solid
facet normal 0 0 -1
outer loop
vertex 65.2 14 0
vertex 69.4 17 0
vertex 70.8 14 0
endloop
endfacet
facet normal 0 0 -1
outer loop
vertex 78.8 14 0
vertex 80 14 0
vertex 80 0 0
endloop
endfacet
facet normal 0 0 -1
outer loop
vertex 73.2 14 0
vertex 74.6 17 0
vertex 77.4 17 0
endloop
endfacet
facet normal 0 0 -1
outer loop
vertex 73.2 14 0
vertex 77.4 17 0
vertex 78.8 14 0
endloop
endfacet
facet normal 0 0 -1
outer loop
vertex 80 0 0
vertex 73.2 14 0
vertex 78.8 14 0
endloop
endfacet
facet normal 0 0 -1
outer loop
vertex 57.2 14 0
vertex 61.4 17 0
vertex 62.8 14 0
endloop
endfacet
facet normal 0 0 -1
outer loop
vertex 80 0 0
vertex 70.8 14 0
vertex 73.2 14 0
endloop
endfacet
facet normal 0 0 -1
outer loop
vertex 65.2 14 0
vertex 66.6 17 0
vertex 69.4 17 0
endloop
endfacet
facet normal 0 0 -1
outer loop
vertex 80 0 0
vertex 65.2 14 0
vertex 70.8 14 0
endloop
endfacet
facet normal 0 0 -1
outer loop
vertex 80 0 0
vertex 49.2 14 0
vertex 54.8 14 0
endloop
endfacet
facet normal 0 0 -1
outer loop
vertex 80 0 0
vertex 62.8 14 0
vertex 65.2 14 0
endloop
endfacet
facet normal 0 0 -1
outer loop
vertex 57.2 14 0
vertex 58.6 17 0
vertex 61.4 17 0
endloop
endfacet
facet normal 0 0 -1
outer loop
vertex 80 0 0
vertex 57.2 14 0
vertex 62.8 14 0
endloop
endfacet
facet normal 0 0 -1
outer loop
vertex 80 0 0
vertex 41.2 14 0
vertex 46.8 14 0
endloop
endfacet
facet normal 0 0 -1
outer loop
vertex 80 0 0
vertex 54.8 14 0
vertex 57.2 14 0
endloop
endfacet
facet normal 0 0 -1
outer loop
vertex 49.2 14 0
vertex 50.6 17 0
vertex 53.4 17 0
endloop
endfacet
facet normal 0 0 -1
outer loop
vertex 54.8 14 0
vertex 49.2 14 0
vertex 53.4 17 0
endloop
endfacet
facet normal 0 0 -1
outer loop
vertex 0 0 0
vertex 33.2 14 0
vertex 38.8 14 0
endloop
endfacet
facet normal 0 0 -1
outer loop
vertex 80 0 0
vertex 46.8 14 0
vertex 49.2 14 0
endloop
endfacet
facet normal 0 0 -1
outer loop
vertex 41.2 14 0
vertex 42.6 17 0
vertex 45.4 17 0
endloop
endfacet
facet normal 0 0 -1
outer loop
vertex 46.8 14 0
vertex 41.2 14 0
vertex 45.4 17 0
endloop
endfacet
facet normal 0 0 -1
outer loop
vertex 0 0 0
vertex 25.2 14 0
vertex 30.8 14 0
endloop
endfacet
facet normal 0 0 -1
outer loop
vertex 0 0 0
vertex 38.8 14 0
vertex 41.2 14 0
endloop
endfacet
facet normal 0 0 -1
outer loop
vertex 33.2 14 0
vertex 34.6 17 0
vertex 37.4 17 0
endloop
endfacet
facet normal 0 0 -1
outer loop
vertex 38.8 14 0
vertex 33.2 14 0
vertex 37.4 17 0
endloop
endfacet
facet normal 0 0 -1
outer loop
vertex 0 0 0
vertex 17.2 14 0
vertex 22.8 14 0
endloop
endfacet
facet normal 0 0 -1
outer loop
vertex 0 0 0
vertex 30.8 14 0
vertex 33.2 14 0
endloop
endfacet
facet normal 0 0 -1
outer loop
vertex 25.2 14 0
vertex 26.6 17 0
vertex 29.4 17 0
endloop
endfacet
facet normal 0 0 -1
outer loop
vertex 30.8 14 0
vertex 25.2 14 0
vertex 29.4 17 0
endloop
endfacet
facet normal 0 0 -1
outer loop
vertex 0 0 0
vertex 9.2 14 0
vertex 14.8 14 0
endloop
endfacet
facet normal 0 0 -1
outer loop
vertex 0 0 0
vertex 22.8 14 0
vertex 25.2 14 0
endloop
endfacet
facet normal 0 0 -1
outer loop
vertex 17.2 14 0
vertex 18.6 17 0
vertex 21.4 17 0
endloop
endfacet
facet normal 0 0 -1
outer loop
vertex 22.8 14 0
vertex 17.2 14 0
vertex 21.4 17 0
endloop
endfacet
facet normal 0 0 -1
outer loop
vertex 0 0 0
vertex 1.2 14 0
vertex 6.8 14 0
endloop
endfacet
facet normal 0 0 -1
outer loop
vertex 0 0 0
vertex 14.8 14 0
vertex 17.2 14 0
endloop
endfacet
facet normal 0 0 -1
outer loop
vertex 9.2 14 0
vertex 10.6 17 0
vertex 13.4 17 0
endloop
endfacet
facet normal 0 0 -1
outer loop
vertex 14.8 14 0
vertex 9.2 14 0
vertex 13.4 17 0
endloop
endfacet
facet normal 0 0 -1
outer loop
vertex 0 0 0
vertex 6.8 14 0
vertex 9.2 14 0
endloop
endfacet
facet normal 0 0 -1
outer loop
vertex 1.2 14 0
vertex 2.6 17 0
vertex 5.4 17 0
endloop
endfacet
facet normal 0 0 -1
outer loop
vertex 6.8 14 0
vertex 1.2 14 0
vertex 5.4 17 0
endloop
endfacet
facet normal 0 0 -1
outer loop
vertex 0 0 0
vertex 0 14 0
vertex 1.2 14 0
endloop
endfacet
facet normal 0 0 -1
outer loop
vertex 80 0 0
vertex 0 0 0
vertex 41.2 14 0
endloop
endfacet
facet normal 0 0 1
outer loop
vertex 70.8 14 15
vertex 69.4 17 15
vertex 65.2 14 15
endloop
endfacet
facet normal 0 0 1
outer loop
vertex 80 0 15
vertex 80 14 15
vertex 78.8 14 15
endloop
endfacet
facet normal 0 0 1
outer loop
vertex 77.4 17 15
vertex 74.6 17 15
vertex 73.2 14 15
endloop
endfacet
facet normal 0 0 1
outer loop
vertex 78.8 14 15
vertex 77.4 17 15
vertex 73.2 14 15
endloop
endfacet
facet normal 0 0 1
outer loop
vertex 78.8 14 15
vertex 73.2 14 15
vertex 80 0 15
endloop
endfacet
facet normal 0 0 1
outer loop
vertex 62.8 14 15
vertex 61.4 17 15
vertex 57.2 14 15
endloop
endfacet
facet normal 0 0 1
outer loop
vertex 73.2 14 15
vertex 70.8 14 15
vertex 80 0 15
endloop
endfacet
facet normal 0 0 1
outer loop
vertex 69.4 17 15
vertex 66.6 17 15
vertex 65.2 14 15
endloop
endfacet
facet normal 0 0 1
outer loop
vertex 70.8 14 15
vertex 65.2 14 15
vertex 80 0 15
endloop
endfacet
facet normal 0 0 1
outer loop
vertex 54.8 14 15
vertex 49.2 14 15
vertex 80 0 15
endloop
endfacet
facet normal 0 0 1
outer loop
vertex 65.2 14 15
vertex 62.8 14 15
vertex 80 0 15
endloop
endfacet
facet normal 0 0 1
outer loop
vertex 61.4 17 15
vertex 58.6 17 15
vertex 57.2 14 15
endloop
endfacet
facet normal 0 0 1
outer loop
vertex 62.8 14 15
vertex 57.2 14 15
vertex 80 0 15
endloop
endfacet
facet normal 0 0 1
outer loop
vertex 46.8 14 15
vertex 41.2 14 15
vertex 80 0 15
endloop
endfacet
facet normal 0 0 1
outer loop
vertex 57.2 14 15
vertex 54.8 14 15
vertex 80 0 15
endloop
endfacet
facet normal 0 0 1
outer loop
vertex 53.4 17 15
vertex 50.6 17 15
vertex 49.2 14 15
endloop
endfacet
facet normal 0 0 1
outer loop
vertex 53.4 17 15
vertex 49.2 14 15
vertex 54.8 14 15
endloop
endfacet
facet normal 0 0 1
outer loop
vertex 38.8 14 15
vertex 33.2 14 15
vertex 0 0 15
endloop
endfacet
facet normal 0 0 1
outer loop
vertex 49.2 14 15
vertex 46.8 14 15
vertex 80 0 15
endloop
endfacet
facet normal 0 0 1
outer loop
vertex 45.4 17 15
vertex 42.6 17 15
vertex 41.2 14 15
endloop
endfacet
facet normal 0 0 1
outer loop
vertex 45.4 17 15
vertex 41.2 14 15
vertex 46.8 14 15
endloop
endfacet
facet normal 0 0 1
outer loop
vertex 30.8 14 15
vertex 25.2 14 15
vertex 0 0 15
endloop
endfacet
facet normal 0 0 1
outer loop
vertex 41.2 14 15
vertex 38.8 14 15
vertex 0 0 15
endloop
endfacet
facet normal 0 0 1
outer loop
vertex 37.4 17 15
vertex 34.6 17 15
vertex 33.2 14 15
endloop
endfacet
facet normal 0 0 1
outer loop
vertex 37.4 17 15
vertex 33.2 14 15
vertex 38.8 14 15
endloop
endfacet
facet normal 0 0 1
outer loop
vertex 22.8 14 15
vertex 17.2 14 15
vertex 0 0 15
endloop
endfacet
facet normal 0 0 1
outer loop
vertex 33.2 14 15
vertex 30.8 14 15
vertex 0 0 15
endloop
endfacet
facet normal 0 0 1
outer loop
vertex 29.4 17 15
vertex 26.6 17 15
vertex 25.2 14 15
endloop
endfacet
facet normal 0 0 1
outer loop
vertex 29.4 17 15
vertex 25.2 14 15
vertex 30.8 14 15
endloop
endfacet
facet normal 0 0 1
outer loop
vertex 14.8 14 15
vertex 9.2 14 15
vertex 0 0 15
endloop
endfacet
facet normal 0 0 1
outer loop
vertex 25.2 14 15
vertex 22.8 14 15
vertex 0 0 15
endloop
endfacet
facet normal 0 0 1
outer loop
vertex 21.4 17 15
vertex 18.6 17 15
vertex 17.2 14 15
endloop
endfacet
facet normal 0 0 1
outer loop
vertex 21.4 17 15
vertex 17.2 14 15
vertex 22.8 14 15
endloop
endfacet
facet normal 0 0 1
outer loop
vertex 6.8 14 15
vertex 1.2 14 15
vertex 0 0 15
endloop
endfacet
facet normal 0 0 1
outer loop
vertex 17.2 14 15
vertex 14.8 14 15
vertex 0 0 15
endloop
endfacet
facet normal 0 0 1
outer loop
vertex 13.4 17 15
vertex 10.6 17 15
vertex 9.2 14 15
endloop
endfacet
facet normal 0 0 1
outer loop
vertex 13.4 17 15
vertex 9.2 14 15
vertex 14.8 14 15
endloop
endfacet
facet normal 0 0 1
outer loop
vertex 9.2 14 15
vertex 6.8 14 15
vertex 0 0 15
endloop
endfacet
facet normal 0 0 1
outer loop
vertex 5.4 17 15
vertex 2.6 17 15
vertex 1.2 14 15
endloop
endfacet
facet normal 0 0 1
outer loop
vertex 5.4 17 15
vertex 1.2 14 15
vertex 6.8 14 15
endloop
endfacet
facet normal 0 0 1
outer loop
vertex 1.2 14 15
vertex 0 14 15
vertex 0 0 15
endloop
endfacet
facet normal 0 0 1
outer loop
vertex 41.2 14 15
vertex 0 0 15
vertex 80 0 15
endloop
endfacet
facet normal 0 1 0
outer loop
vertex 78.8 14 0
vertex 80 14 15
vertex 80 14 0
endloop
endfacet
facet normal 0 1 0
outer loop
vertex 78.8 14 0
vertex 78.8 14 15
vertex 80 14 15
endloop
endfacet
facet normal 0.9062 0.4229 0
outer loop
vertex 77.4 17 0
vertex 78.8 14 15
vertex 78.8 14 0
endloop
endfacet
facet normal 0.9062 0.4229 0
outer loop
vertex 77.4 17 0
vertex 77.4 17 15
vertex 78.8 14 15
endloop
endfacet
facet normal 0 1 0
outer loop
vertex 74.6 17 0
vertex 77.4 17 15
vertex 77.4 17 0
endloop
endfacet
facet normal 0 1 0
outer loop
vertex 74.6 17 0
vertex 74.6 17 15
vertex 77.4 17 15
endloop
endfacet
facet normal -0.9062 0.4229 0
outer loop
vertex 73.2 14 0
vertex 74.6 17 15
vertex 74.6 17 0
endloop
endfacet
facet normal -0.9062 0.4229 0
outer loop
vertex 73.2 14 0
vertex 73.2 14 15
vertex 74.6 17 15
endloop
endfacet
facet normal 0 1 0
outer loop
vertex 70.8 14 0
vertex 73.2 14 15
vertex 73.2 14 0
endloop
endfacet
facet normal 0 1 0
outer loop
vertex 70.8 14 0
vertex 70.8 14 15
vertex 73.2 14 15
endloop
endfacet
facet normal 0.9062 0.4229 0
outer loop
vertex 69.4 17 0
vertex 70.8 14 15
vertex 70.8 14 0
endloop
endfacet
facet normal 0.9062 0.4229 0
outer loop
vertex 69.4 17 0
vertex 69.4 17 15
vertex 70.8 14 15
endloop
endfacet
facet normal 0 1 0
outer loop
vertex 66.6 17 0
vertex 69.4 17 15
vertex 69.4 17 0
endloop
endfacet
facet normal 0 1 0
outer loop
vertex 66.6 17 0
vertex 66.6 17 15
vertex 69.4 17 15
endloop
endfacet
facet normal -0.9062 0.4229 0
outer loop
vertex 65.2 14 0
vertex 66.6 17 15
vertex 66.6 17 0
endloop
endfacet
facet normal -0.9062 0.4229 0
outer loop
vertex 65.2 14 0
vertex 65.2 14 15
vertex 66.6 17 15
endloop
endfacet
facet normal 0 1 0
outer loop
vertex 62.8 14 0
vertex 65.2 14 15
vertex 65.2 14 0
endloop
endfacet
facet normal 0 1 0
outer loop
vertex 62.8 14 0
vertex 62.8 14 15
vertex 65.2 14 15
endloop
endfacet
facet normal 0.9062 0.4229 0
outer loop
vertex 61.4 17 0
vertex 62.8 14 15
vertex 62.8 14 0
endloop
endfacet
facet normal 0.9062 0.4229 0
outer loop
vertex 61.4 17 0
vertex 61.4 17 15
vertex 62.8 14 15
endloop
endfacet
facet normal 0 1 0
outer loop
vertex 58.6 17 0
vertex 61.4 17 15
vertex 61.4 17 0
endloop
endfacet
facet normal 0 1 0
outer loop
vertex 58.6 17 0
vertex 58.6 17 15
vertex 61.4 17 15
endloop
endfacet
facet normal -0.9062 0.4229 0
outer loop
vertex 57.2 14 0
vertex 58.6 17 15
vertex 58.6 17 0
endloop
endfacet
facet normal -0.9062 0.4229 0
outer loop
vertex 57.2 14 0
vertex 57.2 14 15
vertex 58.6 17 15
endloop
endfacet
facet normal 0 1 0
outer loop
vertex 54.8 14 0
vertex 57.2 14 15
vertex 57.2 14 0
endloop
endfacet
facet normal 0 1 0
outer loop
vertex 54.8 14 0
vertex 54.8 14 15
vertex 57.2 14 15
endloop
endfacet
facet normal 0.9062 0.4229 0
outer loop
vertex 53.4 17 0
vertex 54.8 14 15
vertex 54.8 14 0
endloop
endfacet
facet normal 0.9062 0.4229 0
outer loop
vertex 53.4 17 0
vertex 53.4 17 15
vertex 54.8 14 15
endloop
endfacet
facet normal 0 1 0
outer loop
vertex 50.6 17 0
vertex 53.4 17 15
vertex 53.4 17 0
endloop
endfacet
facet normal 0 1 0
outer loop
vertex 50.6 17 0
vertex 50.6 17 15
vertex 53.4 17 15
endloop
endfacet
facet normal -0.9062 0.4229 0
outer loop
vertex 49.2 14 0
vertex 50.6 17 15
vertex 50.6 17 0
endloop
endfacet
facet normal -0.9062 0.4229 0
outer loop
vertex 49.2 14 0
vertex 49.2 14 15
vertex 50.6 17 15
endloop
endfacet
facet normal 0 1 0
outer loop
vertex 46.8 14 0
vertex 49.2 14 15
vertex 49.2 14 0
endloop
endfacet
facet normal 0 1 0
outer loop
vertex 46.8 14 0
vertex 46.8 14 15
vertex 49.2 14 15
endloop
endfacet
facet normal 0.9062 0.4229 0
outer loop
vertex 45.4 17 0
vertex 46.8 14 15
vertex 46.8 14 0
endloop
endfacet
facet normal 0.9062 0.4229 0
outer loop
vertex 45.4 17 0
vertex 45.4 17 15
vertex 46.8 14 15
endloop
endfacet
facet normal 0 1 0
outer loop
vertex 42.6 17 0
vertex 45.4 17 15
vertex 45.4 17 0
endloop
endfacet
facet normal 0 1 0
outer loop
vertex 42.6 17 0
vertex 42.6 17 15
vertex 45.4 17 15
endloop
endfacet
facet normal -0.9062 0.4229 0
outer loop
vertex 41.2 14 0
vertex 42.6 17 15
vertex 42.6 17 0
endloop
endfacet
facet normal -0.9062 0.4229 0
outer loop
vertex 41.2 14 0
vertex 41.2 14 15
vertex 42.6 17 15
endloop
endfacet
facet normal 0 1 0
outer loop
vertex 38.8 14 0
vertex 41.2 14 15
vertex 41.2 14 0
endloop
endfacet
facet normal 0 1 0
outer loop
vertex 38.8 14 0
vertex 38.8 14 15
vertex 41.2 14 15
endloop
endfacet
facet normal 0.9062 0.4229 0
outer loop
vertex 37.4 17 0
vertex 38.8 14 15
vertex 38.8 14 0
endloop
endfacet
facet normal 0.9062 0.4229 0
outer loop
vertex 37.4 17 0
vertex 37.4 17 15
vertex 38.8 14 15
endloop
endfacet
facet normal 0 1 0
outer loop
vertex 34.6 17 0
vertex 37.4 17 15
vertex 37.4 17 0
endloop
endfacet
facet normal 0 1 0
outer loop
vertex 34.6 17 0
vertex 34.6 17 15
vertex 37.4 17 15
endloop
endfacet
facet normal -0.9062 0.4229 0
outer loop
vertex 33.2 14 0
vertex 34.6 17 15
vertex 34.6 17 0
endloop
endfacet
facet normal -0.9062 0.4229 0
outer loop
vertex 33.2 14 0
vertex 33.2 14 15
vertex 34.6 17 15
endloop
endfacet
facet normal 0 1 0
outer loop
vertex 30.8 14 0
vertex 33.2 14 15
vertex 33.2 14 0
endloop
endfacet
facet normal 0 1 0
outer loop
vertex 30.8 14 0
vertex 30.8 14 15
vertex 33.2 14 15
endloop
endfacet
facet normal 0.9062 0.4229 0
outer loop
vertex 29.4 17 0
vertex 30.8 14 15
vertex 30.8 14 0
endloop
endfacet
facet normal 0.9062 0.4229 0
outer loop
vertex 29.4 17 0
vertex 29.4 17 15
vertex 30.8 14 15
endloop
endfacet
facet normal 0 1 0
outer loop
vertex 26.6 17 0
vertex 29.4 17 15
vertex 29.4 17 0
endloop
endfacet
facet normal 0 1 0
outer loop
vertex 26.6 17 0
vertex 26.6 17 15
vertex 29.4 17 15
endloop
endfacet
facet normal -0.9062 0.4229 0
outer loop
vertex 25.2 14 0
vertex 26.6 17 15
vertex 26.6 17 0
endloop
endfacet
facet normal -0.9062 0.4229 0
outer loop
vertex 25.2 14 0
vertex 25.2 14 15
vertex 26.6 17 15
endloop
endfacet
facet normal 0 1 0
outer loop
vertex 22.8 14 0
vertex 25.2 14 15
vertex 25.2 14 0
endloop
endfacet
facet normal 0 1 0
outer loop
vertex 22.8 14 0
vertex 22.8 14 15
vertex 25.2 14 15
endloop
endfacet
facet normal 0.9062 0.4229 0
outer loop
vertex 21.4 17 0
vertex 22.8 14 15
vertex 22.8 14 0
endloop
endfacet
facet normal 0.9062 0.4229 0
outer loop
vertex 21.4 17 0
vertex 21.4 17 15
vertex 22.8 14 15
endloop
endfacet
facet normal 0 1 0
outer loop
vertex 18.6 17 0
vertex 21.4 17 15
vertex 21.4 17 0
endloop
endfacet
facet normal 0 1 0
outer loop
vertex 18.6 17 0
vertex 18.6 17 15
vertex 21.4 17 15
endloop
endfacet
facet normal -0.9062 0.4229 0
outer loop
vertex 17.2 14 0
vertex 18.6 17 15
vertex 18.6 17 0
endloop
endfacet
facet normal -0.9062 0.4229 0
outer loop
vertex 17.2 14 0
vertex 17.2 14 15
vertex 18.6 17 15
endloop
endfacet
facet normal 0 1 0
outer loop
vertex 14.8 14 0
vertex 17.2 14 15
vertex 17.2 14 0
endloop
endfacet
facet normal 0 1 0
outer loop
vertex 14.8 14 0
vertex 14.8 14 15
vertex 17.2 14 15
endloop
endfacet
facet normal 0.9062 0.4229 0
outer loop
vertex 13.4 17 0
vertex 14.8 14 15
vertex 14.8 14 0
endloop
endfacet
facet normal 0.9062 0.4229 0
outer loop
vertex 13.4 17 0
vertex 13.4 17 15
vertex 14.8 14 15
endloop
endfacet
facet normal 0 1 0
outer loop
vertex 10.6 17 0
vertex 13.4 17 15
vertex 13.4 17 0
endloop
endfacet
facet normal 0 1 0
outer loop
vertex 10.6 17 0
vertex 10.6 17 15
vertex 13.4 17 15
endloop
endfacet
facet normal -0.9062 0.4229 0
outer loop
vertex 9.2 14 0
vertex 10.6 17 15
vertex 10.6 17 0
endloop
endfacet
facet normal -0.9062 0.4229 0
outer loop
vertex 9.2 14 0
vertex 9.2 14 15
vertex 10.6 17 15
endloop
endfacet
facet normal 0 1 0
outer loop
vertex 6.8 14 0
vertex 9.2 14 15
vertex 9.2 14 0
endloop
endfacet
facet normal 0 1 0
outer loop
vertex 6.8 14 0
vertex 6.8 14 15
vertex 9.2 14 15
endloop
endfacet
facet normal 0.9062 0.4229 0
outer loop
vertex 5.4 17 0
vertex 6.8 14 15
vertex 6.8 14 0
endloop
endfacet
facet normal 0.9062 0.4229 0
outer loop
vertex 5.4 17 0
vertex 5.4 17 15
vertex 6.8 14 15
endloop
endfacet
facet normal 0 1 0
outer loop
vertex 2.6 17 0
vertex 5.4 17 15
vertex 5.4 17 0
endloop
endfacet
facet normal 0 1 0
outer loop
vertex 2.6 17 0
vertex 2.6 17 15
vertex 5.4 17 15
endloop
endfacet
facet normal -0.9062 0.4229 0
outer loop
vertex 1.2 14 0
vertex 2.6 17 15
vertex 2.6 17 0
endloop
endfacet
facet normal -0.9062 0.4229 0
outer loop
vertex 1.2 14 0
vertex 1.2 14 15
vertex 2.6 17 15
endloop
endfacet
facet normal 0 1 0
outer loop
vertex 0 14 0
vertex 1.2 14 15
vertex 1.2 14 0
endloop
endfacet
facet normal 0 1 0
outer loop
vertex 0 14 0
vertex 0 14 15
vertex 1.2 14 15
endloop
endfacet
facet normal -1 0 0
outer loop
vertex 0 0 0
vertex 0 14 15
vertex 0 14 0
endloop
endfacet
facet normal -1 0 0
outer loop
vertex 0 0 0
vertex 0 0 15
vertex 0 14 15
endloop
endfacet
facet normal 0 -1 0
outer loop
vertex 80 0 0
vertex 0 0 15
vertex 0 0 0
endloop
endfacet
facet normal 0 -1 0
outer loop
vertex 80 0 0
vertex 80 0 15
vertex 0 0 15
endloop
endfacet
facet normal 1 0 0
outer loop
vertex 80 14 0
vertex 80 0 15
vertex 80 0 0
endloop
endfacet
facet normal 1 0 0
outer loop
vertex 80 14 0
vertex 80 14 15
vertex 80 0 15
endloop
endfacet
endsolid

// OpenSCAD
$fn = 32;

// ----------------------------------------------------------------------
// Gear rack: 10 teeth, pitch 8 mm
// ----------------------------------------------------------------------

// --- parameters (mm) ---
teeth = 10;               // number of teeth
pitch = 8;                // tooth pitch, X
root_w = 5.6;             // tooth width at the root
tip_w = 2.8;              // tooth width at the tip
base_h = 14;              // rack body height, Y
tooth_h = 3;              // tooth height above the body
plate_t = 15;             // rack width, Z (extrusion height)

rack_l = teeth * pitch;  // overall length
total_h = base_h + tooth_h;  // overall height

profile = [[0, 0], [80, 0], [80, 14], [78.8, 14], [77.4, 17], [74.6, 17], [73.2, 14], [70.8, 14], [69.4, 17], [66.6, 17], [65.2, 14], [62.8, 14], [61.4, 17], [58.6, 17], [57.2, 14], [54.8, 14], [53.4, 17], [50.6, 17], [49.2, 14], [46.8, 14], [45.4, 17], [42.6, 17], [41.2, 14], [38.8, 14], [37.4, 17], [34.6, 17], [33.2, 14], [30.8, 14], [29.4, 17], [26.6, 17], [25.2, 14], [22.8, 14], [21.4, 17], [18.6, 17], [17.2, 14], [14.8, 14], [13.4, 17], [10.6, 17], [9.2, 14], [6.8, 14], [5.4, 17], [2.6, 17], [1.2, 14], [0, 14]];  // primary outline, 44 points, counter clockwise

// --- the one profile operation ---
linear_extrude(height = plate_t) polygon(points = profile);
